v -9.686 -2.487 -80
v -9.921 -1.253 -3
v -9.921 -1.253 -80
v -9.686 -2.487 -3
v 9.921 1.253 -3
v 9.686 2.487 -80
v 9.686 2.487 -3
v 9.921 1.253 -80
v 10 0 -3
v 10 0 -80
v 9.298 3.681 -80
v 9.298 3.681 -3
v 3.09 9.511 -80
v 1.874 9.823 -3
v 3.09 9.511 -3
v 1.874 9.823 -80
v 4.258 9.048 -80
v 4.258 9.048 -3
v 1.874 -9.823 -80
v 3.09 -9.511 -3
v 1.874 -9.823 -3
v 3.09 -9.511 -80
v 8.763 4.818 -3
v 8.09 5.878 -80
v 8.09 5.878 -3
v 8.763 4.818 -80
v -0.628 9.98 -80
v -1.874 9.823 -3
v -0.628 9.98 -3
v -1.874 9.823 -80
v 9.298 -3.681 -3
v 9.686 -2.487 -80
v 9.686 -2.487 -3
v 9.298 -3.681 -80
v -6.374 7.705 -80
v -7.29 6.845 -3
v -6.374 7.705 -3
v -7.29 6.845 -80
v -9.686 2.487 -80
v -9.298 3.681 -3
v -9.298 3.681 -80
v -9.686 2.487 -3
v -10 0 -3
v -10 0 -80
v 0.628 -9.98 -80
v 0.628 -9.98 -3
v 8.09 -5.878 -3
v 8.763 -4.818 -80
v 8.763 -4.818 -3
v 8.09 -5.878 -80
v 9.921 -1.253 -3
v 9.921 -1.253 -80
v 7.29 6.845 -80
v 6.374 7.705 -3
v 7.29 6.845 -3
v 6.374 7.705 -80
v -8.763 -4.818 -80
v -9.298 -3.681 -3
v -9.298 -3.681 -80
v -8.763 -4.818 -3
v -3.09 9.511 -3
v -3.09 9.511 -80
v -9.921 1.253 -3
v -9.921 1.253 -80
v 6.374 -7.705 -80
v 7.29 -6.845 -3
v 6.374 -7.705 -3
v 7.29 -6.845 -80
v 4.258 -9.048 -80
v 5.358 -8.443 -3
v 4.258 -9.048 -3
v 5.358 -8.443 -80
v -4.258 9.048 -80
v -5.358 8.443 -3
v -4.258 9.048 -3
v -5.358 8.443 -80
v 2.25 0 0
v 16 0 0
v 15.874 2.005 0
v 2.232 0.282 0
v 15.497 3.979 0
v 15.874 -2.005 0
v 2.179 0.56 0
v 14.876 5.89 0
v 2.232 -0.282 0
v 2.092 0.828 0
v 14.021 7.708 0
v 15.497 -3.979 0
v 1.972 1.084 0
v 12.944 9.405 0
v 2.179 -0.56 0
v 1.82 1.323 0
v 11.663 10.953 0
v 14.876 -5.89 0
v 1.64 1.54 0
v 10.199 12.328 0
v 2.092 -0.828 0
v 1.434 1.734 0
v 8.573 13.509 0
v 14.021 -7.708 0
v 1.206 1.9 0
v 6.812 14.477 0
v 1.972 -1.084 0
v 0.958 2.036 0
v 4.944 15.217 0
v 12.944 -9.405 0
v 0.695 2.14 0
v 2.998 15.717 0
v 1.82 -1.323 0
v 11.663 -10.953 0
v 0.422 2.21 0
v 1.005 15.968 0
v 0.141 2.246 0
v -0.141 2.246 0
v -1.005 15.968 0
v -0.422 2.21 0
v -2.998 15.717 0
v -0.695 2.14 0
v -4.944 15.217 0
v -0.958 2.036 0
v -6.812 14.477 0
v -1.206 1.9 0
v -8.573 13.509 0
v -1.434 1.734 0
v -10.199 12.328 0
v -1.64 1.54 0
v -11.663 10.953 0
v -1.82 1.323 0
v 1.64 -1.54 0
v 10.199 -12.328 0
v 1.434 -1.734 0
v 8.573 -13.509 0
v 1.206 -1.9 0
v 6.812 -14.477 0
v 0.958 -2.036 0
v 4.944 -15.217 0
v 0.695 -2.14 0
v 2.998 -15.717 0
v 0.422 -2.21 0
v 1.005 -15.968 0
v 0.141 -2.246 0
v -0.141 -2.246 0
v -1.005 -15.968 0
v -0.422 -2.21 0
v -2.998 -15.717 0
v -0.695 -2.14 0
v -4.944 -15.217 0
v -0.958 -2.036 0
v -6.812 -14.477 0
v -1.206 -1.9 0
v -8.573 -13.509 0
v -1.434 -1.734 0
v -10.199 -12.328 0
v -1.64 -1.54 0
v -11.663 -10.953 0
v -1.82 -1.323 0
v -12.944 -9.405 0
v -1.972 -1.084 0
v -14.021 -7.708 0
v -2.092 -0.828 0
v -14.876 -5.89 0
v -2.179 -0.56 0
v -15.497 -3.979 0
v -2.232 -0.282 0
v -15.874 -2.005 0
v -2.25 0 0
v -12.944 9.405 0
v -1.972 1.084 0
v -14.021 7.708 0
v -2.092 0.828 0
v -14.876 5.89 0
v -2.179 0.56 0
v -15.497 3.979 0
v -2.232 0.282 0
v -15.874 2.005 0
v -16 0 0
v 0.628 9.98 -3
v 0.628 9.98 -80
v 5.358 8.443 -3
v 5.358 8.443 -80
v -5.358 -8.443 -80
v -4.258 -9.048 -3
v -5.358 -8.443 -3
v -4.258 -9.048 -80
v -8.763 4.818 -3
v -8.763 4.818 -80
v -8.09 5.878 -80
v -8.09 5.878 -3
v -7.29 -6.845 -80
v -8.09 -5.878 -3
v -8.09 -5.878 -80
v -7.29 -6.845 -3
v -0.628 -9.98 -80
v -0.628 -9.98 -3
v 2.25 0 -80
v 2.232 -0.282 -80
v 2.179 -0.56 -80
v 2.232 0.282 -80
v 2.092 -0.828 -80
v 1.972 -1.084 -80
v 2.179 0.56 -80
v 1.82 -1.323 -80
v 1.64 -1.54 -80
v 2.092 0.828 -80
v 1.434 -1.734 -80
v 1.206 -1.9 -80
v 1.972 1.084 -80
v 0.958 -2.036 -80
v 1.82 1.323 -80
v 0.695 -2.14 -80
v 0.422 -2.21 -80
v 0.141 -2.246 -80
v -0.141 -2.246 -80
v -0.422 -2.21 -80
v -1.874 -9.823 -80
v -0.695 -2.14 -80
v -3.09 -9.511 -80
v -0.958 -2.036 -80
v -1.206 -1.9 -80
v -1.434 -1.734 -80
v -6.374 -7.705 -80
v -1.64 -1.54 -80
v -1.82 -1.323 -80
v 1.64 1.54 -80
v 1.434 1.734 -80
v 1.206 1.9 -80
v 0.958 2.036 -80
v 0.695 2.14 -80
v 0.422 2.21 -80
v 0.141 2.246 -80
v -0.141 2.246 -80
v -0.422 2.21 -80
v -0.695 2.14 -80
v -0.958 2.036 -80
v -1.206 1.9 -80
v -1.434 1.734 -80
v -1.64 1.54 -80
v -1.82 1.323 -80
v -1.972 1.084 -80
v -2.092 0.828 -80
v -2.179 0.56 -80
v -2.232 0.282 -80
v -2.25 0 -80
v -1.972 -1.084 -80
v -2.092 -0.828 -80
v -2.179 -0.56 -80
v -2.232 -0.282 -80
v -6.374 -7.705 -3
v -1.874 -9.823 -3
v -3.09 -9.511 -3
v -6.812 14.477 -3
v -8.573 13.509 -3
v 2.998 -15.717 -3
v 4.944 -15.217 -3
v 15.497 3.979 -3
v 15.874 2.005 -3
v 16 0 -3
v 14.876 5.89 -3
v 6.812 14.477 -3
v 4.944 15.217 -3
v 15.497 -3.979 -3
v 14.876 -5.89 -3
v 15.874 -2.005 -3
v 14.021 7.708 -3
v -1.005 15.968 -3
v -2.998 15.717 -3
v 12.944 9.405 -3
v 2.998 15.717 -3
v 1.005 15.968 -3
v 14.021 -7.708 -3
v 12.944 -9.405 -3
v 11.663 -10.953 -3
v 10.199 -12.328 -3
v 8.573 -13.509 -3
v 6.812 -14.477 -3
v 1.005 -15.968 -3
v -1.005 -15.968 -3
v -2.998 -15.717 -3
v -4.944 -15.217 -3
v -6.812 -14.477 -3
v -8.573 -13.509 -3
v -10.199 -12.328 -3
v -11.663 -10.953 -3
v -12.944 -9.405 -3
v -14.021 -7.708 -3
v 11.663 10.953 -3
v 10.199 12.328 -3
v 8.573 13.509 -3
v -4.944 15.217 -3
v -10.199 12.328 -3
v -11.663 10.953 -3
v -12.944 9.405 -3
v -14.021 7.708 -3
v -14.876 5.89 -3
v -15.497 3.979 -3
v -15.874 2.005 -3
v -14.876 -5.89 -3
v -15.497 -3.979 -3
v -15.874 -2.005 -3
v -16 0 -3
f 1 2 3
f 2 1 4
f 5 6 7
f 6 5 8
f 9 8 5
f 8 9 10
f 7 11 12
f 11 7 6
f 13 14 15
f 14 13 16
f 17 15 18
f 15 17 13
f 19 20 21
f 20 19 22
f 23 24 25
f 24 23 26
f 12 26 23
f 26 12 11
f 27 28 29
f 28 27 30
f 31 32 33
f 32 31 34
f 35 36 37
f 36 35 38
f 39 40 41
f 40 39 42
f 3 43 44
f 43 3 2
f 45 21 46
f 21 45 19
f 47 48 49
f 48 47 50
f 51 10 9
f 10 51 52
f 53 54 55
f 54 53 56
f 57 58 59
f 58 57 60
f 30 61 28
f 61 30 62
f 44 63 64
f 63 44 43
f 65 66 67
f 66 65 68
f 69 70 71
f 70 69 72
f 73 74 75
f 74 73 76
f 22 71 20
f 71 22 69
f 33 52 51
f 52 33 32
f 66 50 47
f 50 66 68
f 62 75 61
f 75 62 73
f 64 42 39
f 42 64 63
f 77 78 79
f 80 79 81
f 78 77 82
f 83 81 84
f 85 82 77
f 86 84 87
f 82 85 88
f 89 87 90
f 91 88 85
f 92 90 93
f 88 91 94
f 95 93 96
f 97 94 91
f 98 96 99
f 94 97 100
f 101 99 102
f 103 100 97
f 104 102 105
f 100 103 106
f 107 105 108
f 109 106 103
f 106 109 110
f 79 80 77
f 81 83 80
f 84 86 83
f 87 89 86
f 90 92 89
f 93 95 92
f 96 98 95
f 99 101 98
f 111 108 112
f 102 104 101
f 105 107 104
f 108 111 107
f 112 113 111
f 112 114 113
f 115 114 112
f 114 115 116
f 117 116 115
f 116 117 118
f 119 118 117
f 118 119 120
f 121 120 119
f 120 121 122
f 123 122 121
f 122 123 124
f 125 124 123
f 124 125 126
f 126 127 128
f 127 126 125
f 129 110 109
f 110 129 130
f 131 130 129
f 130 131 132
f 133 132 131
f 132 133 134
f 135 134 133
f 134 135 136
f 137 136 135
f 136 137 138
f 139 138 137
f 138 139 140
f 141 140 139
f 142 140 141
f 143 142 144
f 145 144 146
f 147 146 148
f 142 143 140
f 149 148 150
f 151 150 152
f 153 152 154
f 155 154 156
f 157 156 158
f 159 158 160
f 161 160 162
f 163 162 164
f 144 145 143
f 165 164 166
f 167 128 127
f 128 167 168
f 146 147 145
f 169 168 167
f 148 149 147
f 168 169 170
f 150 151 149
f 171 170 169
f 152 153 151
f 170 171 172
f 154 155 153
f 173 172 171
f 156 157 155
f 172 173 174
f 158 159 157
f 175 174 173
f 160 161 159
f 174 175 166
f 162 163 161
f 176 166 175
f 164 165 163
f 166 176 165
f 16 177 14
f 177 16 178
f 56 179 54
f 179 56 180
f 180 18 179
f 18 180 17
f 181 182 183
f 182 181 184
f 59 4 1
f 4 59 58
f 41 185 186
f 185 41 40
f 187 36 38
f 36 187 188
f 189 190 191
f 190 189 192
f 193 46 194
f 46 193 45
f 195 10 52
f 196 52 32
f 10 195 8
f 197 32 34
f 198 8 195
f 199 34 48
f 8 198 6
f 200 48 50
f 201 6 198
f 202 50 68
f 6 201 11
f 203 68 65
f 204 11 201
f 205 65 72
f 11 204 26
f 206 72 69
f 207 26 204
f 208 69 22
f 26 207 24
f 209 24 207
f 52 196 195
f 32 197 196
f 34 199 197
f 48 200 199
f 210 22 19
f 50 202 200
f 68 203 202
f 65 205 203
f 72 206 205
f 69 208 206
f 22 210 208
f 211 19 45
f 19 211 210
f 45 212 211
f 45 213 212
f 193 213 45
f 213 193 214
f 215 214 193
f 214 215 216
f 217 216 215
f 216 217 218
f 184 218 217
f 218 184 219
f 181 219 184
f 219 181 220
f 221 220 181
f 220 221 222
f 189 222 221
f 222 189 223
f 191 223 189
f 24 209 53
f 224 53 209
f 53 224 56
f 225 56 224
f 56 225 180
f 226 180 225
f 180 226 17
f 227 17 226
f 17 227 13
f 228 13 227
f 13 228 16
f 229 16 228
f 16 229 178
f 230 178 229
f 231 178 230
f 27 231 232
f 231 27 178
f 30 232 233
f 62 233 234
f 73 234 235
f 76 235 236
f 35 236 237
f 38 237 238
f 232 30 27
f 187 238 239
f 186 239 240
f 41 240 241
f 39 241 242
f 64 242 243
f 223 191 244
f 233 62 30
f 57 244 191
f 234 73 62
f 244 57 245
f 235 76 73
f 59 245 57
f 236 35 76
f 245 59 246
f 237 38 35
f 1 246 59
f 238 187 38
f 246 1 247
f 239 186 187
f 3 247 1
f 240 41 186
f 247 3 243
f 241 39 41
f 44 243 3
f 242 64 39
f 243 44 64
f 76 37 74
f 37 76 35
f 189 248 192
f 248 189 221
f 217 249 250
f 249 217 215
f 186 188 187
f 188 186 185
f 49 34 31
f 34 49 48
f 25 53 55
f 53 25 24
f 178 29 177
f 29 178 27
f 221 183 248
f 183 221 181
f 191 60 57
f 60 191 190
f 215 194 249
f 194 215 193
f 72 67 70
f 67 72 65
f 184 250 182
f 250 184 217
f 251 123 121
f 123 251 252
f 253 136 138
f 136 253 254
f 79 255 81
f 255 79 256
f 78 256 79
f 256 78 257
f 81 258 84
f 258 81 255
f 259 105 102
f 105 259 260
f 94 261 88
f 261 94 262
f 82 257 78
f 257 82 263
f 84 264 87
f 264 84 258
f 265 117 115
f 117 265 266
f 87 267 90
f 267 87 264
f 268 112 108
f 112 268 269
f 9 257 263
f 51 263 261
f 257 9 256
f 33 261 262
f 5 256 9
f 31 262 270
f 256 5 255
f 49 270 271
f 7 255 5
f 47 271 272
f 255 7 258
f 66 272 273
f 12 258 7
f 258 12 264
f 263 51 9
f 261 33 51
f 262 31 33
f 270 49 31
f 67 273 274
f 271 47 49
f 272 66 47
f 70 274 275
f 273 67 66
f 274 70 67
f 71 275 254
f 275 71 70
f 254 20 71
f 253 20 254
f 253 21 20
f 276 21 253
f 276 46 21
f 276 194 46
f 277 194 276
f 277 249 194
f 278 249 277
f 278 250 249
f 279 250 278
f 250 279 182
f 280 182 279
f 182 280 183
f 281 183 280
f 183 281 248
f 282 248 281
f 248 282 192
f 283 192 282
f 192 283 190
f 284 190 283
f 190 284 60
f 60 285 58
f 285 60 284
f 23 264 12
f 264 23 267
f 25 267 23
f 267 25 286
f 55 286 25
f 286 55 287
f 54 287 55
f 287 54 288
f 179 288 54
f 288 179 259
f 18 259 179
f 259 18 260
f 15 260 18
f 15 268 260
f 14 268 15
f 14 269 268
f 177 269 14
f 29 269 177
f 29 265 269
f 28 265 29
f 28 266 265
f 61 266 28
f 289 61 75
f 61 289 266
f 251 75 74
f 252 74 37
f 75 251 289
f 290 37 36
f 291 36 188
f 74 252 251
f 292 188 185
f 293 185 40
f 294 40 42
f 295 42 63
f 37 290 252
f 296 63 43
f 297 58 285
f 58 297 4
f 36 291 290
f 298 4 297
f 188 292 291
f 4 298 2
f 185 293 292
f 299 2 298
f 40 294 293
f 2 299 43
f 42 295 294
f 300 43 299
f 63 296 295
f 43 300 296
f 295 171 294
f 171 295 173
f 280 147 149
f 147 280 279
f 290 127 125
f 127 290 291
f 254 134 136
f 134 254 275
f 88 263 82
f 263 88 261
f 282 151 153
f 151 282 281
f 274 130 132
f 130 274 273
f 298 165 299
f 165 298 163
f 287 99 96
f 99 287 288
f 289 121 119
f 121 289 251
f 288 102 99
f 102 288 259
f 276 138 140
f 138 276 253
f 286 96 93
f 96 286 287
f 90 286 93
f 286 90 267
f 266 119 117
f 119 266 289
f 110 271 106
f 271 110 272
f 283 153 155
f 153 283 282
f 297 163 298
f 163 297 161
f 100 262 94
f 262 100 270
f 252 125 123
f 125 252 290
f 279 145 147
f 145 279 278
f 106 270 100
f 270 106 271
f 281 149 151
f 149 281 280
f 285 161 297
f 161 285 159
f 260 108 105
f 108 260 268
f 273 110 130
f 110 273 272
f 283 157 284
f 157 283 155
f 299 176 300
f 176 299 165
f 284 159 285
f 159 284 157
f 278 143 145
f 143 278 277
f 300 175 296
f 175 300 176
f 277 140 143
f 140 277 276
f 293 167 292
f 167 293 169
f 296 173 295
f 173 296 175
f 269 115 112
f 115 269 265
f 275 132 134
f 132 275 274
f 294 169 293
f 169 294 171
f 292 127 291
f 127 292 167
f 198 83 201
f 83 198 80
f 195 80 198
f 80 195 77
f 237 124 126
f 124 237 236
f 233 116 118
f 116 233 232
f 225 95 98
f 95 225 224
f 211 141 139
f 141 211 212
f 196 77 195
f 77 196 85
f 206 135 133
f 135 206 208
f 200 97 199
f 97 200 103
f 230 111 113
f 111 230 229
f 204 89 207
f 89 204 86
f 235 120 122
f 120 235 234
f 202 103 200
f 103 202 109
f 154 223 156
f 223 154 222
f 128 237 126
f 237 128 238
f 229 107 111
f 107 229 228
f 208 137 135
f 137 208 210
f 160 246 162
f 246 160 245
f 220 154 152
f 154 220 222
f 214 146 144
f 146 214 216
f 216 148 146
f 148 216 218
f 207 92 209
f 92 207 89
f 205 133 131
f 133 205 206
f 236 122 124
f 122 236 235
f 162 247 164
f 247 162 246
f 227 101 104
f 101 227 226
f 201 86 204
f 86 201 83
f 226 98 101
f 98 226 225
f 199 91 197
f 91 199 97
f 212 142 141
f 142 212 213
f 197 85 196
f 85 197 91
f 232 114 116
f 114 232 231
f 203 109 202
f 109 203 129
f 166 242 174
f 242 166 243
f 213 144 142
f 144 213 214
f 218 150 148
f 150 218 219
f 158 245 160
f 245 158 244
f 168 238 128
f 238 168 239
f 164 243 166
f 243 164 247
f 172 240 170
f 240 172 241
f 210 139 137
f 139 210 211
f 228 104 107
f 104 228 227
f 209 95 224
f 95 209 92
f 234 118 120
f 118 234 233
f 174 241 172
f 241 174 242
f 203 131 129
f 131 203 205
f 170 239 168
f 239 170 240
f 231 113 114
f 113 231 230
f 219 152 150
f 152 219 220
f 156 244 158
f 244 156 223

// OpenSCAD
$fn = 50;


difference() {
	union() {
		translate(v = [0, 0, -80.0000000000]) {
			cylinder(h = 80, r = 10.0000000000);
		}
		translate(v = [0, 0, -3.0000000000]) {
			cylinder(h = 3, r = 16.0000000000);
		}
	}
	union() {
		#translate(v = [0, 0, -80]) {
			cylinder(h = 80, r = 2.2500000000);
		}
	}
}
